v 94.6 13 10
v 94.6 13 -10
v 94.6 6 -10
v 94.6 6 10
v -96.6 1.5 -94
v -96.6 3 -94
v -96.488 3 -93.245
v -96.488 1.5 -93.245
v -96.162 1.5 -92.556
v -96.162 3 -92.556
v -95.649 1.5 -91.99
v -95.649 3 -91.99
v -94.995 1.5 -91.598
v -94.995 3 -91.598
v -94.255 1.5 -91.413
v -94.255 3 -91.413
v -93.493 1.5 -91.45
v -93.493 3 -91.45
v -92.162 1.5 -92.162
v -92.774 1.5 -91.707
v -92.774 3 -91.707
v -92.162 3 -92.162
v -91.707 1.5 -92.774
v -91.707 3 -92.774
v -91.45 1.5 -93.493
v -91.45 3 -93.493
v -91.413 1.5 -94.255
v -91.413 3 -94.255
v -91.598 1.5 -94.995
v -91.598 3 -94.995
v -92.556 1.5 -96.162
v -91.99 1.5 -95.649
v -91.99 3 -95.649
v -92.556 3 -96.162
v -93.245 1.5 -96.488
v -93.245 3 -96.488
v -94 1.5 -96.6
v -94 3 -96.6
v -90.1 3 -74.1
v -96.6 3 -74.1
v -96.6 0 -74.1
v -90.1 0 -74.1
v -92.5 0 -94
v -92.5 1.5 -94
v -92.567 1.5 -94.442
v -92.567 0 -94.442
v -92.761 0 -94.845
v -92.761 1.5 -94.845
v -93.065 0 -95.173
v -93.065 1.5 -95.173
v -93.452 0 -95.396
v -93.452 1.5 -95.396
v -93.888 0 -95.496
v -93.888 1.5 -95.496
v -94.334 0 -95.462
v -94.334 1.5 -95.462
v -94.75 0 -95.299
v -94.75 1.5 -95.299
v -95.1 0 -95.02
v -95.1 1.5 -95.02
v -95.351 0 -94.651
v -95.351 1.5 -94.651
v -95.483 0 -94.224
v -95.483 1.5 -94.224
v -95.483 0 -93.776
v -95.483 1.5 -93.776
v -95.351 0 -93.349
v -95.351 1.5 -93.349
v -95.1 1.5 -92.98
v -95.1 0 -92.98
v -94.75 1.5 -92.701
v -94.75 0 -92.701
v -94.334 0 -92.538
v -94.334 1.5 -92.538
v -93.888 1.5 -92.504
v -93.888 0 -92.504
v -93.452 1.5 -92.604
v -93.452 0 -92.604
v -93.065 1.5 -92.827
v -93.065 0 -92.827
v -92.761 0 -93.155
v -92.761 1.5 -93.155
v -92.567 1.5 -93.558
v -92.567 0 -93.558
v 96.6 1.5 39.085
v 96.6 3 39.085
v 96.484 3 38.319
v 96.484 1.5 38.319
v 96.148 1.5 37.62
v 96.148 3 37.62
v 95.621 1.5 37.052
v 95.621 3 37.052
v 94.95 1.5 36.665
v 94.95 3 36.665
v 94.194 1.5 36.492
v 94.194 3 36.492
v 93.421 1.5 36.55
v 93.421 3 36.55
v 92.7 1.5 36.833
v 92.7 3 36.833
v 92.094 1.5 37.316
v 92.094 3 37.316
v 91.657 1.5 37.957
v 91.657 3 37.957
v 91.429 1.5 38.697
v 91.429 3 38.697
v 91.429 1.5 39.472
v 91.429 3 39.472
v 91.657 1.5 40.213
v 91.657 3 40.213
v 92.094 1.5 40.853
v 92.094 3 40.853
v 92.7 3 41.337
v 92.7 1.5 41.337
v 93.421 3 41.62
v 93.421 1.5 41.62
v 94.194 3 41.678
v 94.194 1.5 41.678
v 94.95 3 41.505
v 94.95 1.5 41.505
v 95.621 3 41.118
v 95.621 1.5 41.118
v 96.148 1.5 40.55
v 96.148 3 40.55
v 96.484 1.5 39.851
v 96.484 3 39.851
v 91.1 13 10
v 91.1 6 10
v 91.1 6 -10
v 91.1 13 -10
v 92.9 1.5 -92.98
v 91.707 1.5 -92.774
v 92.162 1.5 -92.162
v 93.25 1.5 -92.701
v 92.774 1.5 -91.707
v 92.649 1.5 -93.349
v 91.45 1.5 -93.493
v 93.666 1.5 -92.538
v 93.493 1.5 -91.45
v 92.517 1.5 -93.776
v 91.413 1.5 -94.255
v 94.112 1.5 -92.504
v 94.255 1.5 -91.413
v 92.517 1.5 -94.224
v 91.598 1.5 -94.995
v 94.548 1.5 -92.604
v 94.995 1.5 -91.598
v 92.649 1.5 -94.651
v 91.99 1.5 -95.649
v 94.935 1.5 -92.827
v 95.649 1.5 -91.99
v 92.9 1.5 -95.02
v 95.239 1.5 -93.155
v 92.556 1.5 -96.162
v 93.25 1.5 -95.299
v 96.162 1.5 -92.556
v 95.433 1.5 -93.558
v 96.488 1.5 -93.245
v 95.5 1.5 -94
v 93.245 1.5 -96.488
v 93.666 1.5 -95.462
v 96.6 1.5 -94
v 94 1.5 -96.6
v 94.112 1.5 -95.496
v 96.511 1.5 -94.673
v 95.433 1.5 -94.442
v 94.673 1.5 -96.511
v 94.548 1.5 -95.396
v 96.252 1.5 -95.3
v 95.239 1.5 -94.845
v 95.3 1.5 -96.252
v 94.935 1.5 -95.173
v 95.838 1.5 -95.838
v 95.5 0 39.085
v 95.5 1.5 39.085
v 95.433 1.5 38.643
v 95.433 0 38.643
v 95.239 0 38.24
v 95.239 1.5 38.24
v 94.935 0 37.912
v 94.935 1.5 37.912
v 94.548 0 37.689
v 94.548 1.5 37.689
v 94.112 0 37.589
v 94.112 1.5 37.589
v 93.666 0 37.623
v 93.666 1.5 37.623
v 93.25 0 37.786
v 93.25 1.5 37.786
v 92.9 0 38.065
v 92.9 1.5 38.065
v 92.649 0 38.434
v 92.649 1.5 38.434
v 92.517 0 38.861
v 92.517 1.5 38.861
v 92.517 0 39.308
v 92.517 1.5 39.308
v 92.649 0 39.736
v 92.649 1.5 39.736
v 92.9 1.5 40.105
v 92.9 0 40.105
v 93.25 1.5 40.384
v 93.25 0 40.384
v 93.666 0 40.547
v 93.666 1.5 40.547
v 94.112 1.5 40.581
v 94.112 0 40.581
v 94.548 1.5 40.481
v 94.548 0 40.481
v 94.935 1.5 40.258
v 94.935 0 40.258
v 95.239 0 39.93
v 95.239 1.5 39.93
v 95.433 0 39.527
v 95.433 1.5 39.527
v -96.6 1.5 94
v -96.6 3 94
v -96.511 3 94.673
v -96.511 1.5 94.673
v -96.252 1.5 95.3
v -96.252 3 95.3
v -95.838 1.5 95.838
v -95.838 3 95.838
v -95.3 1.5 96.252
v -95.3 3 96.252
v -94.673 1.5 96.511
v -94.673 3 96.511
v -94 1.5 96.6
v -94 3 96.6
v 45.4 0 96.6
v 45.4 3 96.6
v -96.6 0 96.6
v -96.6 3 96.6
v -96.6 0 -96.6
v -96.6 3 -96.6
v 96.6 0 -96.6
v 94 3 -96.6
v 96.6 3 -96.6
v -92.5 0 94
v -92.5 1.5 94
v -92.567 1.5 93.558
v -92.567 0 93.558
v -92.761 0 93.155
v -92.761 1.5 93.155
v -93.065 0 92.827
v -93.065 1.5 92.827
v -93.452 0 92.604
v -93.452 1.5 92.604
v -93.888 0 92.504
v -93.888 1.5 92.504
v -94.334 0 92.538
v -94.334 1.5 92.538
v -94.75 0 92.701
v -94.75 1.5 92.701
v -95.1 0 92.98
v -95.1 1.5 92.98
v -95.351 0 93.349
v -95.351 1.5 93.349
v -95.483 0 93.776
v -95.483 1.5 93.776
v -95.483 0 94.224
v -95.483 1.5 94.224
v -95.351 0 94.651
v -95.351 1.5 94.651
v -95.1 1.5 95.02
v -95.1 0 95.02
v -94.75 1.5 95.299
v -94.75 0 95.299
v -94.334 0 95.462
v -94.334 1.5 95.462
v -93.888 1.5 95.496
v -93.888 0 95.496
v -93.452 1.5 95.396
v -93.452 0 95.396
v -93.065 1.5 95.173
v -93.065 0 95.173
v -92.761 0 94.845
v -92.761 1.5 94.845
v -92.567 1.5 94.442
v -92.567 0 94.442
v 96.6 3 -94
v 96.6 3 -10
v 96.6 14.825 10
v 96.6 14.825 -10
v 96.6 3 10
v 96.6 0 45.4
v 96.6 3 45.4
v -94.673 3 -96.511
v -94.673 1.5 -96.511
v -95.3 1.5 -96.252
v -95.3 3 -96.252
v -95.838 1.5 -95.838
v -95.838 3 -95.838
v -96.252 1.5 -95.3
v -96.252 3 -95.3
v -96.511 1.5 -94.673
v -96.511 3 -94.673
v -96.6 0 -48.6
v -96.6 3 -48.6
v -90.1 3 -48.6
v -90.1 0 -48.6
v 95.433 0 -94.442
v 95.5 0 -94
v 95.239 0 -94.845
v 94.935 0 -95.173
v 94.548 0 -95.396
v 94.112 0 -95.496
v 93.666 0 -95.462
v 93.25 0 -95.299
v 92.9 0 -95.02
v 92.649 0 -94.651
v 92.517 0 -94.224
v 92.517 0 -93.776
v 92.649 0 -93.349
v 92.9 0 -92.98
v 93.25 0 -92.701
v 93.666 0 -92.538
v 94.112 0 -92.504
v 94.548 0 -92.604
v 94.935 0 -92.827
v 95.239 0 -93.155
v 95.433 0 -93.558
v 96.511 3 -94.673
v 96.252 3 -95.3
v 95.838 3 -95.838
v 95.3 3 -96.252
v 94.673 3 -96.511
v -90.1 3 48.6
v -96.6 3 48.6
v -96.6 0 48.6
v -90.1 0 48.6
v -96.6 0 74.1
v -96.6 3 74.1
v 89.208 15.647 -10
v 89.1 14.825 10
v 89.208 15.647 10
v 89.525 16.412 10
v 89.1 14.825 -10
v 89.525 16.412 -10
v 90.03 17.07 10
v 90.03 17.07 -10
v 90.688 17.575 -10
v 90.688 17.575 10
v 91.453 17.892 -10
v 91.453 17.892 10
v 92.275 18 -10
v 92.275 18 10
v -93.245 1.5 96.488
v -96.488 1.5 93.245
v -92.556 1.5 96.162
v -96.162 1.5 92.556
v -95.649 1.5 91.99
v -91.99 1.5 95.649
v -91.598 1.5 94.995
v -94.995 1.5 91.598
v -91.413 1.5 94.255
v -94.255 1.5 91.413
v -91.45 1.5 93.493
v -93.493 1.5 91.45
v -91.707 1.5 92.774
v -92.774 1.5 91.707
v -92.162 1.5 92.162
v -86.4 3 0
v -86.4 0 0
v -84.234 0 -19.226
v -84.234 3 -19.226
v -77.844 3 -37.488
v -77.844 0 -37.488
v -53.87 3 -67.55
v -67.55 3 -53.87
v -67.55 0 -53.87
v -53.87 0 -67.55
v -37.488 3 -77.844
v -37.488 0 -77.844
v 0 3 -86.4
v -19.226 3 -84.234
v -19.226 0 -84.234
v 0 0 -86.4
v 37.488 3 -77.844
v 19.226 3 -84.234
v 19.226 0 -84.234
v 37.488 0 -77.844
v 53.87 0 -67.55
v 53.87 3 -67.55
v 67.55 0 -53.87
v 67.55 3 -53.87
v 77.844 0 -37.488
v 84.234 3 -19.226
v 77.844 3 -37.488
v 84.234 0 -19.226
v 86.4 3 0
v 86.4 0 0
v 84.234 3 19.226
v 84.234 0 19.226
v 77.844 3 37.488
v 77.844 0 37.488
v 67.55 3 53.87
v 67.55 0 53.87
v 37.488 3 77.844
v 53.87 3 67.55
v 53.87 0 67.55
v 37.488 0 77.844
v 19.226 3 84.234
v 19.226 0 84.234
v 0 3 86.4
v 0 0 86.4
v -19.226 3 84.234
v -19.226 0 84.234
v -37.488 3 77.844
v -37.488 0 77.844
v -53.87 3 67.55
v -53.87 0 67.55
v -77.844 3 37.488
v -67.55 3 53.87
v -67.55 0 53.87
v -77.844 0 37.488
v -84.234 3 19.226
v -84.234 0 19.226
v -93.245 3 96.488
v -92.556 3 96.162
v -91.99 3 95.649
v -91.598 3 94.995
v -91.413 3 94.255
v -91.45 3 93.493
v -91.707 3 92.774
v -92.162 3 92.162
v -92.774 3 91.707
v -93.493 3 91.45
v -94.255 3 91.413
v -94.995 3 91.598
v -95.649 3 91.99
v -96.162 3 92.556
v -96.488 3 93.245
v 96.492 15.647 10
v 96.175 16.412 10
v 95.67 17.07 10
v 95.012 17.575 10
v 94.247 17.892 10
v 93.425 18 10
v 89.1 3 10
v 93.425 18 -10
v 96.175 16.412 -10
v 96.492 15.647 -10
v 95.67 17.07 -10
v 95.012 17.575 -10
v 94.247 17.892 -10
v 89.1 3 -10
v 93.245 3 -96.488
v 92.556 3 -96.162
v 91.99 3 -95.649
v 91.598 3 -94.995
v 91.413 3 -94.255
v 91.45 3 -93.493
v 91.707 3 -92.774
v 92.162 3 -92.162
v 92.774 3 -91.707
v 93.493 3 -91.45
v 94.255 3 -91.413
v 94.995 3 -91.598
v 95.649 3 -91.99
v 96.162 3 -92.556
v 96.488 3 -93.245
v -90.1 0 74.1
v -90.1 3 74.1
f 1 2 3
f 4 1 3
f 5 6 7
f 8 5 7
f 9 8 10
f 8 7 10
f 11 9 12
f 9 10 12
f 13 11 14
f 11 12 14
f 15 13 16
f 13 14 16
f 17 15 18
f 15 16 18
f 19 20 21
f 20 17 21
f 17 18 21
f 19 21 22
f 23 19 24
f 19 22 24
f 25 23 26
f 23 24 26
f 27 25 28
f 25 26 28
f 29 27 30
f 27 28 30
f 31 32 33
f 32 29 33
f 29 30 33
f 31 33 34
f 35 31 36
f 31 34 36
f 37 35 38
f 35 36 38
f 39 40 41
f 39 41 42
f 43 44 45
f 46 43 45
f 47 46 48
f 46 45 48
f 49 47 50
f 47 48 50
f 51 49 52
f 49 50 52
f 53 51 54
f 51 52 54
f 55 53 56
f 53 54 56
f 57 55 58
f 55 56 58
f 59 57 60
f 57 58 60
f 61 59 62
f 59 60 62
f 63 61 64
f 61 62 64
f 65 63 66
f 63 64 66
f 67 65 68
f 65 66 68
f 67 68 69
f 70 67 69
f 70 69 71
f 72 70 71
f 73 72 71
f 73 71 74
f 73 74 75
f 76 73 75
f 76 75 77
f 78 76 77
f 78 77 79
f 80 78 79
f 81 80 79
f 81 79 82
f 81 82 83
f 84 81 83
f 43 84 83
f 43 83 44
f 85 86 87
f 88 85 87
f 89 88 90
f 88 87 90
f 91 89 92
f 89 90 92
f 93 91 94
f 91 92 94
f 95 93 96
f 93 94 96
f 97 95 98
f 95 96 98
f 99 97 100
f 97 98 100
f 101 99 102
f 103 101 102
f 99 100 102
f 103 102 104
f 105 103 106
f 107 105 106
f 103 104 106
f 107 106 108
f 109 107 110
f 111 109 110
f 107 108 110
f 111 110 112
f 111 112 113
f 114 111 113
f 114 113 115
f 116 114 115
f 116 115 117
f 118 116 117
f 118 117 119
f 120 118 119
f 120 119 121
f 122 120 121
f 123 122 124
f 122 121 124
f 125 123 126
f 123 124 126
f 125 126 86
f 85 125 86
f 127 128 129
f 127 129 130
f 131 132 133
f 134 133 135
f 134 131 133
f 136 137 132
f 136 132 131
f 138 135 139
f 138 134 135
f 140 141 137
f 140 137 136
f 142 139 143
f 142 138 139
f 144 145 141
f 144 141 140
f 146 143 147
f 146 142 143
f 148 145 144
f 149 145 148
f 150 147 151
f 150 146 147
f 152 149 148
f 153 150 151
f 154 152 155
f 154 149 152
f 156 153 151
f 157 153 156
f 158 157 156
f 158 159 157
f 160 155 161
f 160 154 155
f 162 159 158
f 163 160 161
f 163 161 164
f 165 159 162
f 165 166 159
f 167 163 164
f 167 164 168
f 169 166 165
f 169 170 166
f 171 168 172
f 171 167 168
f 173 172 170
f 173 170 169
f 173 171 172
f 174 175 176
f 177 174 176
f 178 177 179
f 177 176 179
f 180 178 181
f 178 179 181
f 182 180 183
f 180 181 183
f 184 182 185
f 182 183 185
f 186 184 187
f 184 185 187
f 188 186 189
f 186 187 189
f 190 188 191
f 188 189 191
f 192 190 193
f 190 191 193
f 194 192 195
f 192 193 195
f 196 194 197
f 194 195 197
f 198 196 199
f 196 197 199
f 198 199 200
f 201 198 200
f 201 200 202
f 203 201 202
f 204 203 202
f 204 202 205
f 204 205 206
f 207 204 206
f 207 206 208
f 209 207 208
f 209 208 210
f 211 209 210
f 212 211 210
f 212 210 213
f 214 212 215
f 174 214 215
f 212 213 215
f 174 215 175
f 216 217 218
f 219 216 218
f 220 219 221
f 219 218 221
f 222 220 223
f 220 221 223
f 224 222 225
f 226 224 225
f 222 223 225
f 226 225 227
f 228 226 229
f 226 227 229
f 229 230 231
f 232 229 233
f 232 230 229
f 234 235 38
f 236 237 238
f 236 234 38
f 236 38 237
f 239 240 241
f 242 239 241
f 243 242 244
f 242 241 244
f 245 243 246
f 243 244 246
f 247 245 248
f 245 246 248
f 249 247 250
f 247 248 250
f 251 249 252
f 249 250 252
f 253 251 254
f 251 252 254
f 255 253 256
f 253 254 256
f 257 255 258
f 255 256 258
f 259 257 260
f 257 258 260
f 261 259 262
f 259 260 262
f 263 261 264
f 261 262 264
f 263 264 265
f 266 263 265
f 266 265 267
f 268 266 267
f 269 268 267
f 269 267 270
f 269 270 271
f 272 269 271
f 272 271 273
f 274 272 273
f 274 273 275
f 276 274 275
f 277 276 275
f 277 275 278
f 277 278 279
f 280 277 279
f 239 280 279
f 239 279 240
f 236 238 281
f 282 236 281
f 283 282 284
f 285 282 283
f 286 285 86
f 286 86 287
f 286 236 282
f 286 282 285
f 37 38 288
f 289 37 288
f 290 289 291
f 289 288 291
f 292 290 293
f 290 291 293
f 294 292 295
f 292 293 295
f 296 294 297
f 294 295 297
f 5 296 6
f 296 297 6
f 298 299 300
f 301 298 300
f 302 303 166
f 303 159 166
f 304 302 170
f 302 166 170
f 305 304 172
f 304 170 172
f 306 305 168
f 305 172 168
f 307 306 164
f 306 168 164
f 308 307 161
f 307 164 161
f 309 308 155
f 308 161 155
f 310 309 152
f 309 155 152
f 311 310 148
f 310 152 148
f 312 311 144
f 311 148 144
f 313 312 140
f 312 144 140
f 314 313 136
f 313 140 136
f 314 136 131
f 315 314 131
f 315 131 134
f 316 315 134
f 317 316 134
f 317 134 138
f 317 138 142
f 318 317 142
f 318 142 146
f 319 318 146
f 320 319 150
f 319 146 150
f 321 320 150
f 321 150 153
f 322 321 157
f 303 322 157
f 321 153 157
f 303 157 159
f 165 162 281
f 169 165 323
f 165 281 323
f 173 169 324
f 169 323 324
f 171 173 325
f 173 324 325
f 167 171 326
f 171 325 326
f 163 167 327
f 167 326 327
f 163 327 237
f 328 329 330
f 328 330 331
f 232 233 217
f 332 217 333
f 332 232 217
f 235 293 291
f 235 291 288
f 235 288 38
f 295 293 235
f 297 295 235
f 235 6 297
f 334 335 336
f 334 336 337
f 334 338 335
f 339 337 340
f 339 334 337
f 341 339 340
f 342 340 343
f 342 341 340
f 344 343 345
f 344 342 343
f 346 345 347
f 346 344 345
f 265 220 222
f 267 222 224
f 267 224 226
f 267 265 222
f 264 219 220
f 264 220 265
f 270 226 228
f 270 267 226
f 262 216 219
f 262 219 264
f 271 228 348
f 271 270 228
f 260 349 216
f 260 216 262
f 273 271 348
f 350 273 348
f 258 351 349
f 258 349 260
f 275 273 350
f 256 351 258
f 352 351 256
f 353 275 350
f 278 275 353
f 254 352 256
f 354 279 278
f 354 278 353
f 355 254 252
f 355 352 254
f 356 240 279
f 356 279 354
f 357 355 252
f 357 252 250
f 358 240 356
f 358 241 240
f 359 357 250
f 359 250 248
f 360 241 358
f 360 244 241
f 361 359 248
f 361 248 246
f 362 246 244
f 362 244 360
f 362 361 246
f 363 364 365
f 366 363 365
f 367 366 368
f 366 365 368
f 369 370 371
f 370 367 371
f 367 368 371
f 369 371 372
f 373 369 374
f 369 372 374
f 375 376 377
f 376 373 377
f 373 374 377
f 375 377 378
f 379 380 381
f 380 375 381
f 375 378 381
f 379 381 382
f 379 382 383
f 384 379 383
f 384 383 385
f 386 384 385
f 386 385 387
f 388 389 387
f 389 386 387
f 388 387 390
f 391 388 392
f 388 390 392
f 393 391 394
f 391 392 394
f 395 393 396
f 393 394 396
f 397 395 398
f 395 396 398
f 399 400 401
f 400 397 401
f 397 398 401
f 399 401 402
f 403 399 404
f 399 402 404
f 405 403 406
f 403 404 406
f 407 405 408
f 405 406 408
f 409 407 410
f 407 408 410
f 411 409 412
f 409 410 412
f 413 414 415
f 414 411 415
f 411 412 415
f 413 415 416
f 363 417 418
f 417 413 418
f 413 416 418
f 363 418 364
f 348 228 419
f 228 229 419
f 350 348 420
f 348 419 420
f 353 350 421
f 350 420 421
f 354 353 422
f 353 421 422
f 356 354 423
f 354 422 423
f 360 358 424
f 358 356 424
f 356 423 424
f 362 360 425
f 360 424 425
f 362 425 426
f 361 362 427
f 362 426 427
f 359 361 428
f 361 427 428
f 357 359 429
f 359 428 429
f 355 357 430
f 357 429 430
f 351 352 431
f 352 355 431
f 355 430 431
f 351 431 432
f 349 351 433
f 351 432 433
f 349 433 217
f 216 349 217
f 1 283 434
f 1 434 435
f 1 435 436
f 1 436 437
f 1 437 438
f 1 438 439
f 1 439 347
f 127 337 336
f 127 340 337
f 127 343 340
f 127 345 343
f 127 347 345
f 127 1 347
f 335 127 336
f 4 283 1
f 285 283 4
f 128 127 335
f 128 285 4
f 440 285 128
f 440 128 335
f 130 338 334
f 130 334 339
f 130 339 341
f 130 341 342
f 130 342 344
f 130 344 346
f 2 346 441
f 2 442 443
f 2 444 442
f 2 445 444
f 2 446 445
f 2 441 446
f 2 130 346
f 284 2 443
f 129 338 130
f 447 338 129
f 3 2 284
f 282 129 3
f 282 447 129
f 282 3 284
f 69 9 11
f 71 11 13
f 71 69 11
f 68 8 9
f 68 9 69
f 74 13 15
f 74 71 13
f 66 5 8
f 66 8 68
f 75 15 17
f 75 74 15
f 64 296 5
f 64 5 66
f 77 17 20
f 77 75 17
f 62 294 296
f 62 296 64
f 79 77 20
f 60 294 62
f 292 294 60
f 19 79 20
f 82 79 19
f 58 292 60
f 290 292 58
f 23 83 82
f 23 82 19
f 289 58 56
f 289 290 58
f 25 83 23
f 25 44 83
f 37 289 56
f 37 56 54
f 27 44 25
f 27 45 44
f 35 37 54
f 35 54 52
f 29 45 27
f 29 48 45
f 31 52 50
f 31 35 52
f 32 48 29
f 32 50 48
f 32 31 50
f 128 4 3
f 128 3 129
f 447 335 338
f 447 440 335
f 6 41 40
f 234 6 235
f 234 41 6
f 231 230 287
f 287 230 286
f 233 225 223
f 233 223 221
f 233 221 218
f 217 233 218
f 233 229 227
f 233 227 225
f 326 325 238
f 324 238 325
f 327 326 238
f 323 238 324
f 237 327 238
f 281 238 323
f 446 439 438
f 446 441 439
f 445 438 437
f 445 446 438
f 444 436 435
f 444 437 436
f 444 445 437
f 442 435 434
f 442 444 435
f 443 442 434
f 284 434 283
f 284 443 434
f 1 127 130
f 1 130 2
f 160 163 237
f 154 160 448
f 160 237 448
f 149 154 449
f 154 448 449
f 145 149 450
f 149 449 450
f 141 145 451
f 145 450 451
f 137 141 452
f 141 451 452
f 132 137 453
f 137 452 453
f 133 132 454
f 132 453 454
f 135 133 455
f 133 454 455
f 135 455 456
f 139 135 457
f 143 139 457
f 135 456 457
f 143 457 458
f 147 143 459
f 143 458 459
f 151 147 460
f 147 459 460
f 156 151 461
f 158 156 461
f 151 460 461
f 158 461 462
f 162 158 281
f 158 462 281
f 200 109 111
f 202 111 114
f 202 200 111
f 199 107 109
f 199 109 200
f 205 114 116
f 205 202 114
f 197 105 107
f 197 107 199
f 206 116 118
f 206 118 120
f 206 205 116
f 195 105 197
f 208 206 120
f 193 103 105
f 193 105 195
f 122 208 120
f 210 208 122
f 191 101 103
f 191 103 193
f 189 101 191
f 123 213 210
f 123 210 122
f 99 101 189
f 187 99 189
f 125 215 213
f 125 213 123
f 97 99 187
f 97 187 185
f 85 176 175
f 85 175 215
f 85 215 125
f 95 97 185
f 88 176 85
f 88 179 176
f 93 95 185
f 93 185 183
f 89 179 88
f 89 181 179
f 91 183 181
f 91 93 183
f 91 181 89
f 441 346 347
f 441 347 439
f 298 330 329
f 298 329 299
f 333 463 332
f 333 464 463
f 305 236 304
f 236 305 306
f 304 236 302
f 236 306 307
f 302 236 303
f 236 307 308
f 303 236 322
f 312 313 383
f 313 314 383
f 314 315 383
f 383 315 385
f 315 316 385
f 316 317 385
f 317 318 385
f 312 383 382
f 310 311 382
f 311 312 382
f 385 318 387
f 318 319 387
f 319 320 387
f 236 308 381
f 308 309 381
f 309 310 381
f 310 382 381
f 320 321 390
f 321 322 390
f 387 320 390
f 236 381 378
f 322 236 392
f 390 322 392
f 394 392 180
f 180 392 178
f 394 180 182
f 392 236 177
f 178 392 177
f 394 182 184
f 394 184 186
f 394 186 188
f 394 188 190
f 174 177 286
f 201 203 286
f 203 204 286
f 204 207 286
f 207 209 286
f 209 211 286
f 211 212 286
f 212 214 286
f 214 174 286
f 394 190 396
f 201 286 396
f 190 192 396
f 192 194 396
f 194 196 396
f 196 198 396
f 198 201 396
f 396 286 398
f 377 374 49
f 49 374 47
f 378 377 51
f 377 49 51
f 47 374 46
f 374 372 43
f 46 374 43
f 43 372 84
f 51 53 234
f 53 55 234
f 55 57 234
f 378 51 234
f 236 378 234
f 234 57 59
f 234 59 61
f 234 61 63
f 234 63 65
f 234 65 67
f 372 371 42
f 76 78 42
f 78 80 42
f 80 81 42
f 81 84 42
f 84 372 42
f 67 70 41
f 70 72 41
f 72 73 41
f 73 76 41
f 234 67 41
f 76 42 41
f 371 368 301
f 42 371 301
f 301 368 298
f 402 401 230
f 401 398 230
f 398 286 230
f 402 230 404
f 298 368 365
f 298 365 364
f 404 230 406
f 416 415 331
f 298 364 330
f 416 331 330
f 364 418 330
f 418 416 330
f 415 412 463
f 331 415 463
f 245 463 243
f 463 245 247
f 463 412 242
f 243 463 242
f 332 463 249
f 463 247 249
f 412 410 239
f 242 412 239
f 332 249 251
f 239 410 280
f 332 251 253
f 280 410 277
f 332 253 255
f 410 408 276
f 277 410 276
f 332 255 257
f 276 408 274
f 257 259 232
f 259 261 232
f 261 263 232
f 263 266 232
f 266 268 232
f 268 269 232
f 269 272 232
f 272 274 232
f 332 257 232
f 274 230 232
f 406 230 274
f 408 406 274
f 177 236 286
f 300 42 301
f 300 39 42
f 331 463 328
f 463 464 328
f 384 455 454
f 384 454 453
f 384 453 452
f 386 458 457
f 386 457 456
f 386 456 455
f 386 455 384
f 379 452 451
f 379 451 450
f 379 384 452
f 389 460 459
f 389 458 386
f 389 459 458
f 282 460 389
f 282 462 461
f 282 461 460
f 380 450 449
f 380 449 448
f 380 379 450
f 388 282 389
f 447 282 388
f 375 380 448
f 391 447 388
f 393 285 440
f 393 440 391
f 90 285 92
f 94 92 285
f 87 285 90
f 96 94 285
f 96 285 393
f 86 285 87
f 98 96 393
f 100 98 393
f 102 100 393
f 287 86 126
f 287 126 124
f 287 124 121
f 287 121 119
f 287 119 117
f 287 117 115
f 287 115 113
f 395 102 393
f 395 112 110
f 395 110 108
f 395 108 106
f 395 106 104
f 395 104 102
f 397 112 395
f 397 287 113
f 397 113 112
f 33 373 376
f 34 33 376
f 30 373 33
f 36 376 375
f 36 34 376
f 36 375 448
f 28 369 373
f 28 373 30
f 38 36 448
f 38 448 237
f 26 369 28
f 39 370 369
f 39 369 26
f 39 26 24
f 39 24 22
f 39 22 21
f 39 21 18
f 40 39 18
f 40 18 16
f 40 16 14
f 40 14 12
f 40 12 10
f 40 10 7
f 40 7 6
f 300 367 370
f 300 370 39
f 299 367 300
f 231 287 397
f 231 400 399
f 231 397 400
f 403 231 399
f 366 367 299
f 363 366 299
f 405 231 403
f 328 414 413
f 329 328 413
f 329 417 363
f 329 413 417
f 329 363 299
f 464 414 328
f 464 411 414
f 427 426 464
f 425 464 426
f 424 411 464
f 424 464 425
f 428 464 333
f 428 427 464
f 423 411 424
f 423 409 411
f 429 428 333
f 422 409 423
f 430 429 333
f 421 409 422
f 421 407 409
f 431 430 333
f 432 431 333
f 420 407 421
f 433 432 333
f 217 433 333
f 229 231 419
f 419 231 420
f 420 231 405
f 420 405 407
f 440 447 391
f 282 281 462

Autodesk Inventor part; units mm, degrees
ref_plane "YZ Plane" through (0, 0, 0) normal (1, 0, 0) x (0, 1, 0)
ref_plane "XZ Plane" through (0, 0, 0) normal (0, 1, 0) x (-1, 0, 0)
ref_plane "XY Plane" through (0, 0, 0) normal (0, 0, 1) x (1, 0, 0)
sketch "Sketch1" plane through (0, 0, 0) normal (0, 1, 0) x (-1, 0, 0)
  line L0 (101.6, -101.6) -> (-101.6, -101.6)
  line L1 (-101.6, -101.6) -> (-101.6, 101.6)
  line L2 (-101.6, 101.6) -> (101.6, 101.6)
  line L3 (101.6, 101.6) -> (101.6, -101.6)
  line L4 (96.6, -96.6) -> (-96.6, -96.6)
  line L5 (-96.6, -96.6) -> (-96.6, 96.6)
  line L6 (-96.6, 96.6) -> (96.6, 96.6)
  line L7 (96.6, 96.6) -> (96.6, -96.6)
  line L8 (101.6, 101.6) -> (-40.4, 101.6)
  circle A0 centre (0, 0) radius 86.4
  circle A1 centre (0, 0) radius 109.3376
  line L9 (-40.4, 101.6) -> (-101.6, 40.4)
  line L10 (-45.4, 101.6) -> (-101.6, 45.4)
  line L11 (96.6, 96.6) -> (96.6, 101.6)
  line L12 (-45.4, 101.6) -> (-35.4, 101.6)
  line L13 (-35.4, 101.6) -> (-35.4, 96.6)
  line L14 (-35.4, 96.6) -> (-45.4, 96.6)
  line L15 (-45.4, 96.6) -> (-45.4, 101.6)
  circle A2 centre (0, 0) radius 111.3376
  point P0 (96.6, 51.2168)
  point P1 (101.6, 40.4)
  point P2 (101.6, -40.4)
  point P3 (96.6, -51.2168)
  point P4 (-96.6, 45.4)
  point P5 (-45.4, 96.6)
  dimension "d0" = 203.2
  dimension "d1" = 203.2
  dimension "d2" = 101.6
  dimension "d3" = 101.6
  dimension "d4" = 5
  dimension "d5" = 5
  dimension "d6" = 5
  dimension "d7" = 5
  dimension "d10" = 142
  dimension "d12" = 61.2
  dimension "d14" = 172.8
  dimension "d15" = 5
  dimension "d16" = 5
  dimension "d17" = 10
  dimension "d34" = 2
extrude "Extrusion1" add sketch "Sketch1" along normal blind 3 contours A2 L7 L4 | L4 A1 L7 A2 | L4 A1 L5 L9 L6 L7 | A2 L5 A1 L4 | L4 L5 A2 | A1 L6 A2 L7 | A2 L6 L7
sketch "Sketch5" plane through (0, 3, 0) normal (0, 1, 0) x (1, 0, 0)
  line L0 (-96.6, -96.6) -> (45.4, -96.6) projected
  circle A0 centre (0, 0) radius 86.4 projected
  line L1 (96.6, -45.4) -> (96.6, 96.6) projected
  line L2 (96.6, 0) -> (89.1, 0)
  line L3 (89.1, 0) -> (89.1, 10)
  line L4 (89.1, 10) -> (96.6, 10)
  line L5 (96.6, 10) -> (96.6, 0)
  line L6 (89.1, 0) -> (96.6, 0)
  line L7 (96.6, 0) -> (96.6, -10)
  line L8 (96.6, -10) -> (89.1, -10)
  line L9 (89.1, -10) -> (89.1, 0)
  line L10 (0, 0) -> (96.6, 0)
  point P0 (10, -96.6)
  dimension "d52" = 7.5
  dimension "d53" = 7.5
  dimension "d54" = 10
  dimension "d55" = 10
extrude "Extrusion4" add sketch "Sketch5" along normal blind 15 contours L3 L4 L1 L2 | L2 L1 L8 L9
sketch "Sketch7" plane through (89.1, 3, 10) normal (0, 0, 1) x (1, 0, 0)
  line L0 (2, 10) -> (5.5, 10)
  line L1 (5.5, 10) -> (5.5, 3)
  line L2 (5.5, 3) -> (2, 3)
  line L3 (2, 3) -> (2, 10)
  line L4 (7.5, 0) -> (7.5, 15)
  line L5 (0, 0) -> (0, 15)
  line L6 (0, 15) -> (7.5, 15)
  point P0 (-89.1, -3)
  dimension "d56" = 3.5
  dimension "d57" = 2
  dimension "d58" = 2
  dimension "d59" = 5
  dimension "d60" = 7
extrude "Extrusion6" cut sketch "Sketch7" against normal through all
fillet "Fillet7" radius 3.175 2 edges at (96.6, 18, 0) (89.1, 18, 0)
sketch "Sketch8" plane through (0, 3, 0) normal (0, 1, 0) x (1, 0, 0)
  arc A0 (-101.6, -98.425) -> (-98.425, -101.6) centre (-98.425, -98.425) ccw
  line L0 (44.0849, 101.6) -> (-98.425, 101.6)
  line L1 (-101.6, 98.425) -> (-101.6, -98.425)
  line L2 (-101.6, -46.1) -> (-101.6, -76.6)
  line L3 (-96.6, -96.6) -> (-96.6, 96.6)
  line L4 (-96.6, -46.1) -> (-96.6, -76.6)
  line L5 (-101.6, -76.6) -> (-96.6, -76.6)
  line L6 (-101.6, -46.1) -> (-96.6, -46.1)
  line L7 (-98.425, -101.6) -> (101.6, -101.6)
  line L8 (0, 0) -> (-101.6, 0)
  line L9 (-101.6, 46.1) -> (-101.6, 76.6)
  line L10 (-96.6, 46.1) -> (-96.6, 76.6)
  line L11 (-101.6, 76.6) -> (-96.6, 76.6)
  line L12 (-101.6, 46.1) -> (-96.6, 46.1)
  line L13 (-96.6, -76.6) -> (-90.1, -76.6)
  line L14 (-90.1, -76.6) -> (-90.1, -46.1)
  line L15 (-90.1, -46.1) -> (-96.6, -46.1)
  line L16 (-96.6, -46.1) -> (-96.6, -76.6)
  arc A1 (-98.425, 101.6) -> (-101.6, 98.425) centre (-98.425, 98.425) ccw
  line L17 (-101.6, 46.1) -> (-101.6, 76.6)
  line L18 (-96.6, 46.1) -> (-96.6, 76.6)
  line L19 (-101.6, 76.6) -> (-96.6, 76.6)
  line L20 (-101.6, 46.1) -> (-96.6, 46.1)
  line L21 (-96.6, 76.6) -> (-90.1, 76.6)
  line L22 (-90.1, 76.6) -> (-90.1, 46.1)
  line L23 (-90.1, 46.1) -> (-96.6, 46.1)
  line L24 (-96.6, 46.1) -> (-96.6, 76.6)
  line L25 (-96.6, -76.6) -> (-101.6, -76.6)
  line L26 (-101.6, -76.6) -> (-101.6, -74.1)
  line L27 (-101.6, -74.1) -> (-96.6, -74.1)
  line L28 (-96.6, -74.1) -> (-96.6, -76.6)
  line L29 (-96.6, -46.1) -> (-101.6, -46.1)
  line L30 (-101.6, -46.1) -> (-101.6, -48.6)
  line L31 (-101.6, -48.6) -> (-96.6, -48.6)
  line L32 (-96.6, -48.6) -> (-96.6, -46.1)
  line L33 (-96.6, -76.6) -> (-90.1, -76.6)
  line L34 (-90.1, -76.6) -> (-90.1, -74.1)
  line L35 (-90.1, -74.1) -> (-96.6, -74.1)
  line L36 (-96.6, -74.1) -> (-96.6, -76.6)
  line L37 (-96.6, -48.6) -> (-90.1, -48.6)
  line L38 (-90.1, -48.6) -> (-90.1, -46.1)
  line L39 (-90.1, -46.1) -> (-96.6, -46.1)
  line L40 (-96.6, -46.1) -> (-96.6, -48.6)
  line L41 (-96.6, 96.6) -> (-96.6, -96.6) projected
  line L42 (-90.1, 46.1) -> (-96.6, 46.1)
  line L43 (-96.6, 46.1) -> (-96.6, 48.6)
  line L44 (-96.6, 48.6) -> (-90.1, 48.6)
  line L45 (-90.1, 48.6) -> (-90.1, 46.1)
  line L46 (-90.1, 76.6) -> (-96.6, 76.6)
  line L47 (-96.6, 76.6) -> (-96.6, 74.1)
  line L48 (-96.6, 74.1) -> (-90.1, 74.1)
  line L49 (-90.1, 74.1) -> (-90.1, 76.6)
  point P0 (-98.425, 98.425)
  point P1 (46.1, 101.6)
  point P2 (46.1, 96.6)
  point P3 (76.6, 96.6)
  point P4 (76.6, 101.6)
  point P5 (-46.1, 96.6)
  dimension "d64" = 30.5
  dimension "d65" = 25
  dimension "d66" = 6.5
  dimension "d118" = 2.5
  dimension "d119" = 2.5
  dimension "d120" = 2.5
  dimension "d121" = 2.5
extrude "Extrusion7" cut sketch "Sketch8" against normal through all contours L48 L22 L44 L3 | L37 L14 L35 L3
sketch "Sketch11" plane through (0, 3, 0) normal (0, 1, 0) x (1, 0, 0)
  line L0 (-94, 94) -> (94, 94)
  line L1 (94, 94) -> (94, -94)
  line L2 (94, -94) -> (-94, -94)
  line L3 (-94, -94) -> (-94, 94)
  circle A0 centre (-94, 94) radius 1.5
  circle A1 centre (94, 94) radius 1.5
  circle A2 centre (-94, -94) radius 1.5
  circle A3 centre (94, -39.0849) radius 1.5
  point P0 (0, 0)
  point P1 (0, 0)
  dimension "d98" = 94
  dimension "d99" = 94
  dimension "d100" = 94
  dimension "d101" = 94
  dimension "d102" = 3
  dimension "d103" = 3
  dimension "d104" = 3
  dimension "d105" = 3
extrude "Extrusion8" cut sketch "Sketch11" against normal blind 10 contours L3 A0 L0 | L0 A0 L3 | A1 L1 L0 | L0 L1 A1 | A2 L2 L3 | L3 L2 A2 | A3 L1 | L1 A3
sketch "Sketch12" plane through (0, 3, 0) normal (0, 1, 0) x (1, 0, 0)
  line L0 (-94, 94) -> (94, 94)
  line L1 (94, 94) -> (94, -94)
  line L2 (94, -94) -> (-94, -94)
  line L3 (-94, -94) -> (-94, 94)
  circle A0 centre (-94, 94) radius 2.6
  circle A1 centre (94, 94) radius 2.6
  circle A2 centre (-94, -94) radius 2.6
  circle A3 centre (94, -39.0849) radius 2.6
  point P0 (0, 0)
  point P1 (0, 0)
  point P2 (0, 0)
  dimension "d108" = 94
  dimension "d109" = 94
  dimension "d110" = 94
  dimension "d111" = 94
  dimension "d112" = 5.2
  dimension "d113" = 5.2
  dimension "d114" = 5.2
  dimension "d115" = 5.2
extrude "Extrusion9" cut sketch "Sketch12" against normal blind 1.5 contours L3 A0 L0 | L0 A0 L3 | A1 L1 L0 | L0 L1 A1 | A2 L2 L3 | L3 L2 A2 | A3 L1 | L1 A3
equation "\"d1\" = d0"
equation "\"d2\" = 0.5 * d0"
equation "\"d3\" = 0.5 * d0"
properties part number "Box_Walls_2"
